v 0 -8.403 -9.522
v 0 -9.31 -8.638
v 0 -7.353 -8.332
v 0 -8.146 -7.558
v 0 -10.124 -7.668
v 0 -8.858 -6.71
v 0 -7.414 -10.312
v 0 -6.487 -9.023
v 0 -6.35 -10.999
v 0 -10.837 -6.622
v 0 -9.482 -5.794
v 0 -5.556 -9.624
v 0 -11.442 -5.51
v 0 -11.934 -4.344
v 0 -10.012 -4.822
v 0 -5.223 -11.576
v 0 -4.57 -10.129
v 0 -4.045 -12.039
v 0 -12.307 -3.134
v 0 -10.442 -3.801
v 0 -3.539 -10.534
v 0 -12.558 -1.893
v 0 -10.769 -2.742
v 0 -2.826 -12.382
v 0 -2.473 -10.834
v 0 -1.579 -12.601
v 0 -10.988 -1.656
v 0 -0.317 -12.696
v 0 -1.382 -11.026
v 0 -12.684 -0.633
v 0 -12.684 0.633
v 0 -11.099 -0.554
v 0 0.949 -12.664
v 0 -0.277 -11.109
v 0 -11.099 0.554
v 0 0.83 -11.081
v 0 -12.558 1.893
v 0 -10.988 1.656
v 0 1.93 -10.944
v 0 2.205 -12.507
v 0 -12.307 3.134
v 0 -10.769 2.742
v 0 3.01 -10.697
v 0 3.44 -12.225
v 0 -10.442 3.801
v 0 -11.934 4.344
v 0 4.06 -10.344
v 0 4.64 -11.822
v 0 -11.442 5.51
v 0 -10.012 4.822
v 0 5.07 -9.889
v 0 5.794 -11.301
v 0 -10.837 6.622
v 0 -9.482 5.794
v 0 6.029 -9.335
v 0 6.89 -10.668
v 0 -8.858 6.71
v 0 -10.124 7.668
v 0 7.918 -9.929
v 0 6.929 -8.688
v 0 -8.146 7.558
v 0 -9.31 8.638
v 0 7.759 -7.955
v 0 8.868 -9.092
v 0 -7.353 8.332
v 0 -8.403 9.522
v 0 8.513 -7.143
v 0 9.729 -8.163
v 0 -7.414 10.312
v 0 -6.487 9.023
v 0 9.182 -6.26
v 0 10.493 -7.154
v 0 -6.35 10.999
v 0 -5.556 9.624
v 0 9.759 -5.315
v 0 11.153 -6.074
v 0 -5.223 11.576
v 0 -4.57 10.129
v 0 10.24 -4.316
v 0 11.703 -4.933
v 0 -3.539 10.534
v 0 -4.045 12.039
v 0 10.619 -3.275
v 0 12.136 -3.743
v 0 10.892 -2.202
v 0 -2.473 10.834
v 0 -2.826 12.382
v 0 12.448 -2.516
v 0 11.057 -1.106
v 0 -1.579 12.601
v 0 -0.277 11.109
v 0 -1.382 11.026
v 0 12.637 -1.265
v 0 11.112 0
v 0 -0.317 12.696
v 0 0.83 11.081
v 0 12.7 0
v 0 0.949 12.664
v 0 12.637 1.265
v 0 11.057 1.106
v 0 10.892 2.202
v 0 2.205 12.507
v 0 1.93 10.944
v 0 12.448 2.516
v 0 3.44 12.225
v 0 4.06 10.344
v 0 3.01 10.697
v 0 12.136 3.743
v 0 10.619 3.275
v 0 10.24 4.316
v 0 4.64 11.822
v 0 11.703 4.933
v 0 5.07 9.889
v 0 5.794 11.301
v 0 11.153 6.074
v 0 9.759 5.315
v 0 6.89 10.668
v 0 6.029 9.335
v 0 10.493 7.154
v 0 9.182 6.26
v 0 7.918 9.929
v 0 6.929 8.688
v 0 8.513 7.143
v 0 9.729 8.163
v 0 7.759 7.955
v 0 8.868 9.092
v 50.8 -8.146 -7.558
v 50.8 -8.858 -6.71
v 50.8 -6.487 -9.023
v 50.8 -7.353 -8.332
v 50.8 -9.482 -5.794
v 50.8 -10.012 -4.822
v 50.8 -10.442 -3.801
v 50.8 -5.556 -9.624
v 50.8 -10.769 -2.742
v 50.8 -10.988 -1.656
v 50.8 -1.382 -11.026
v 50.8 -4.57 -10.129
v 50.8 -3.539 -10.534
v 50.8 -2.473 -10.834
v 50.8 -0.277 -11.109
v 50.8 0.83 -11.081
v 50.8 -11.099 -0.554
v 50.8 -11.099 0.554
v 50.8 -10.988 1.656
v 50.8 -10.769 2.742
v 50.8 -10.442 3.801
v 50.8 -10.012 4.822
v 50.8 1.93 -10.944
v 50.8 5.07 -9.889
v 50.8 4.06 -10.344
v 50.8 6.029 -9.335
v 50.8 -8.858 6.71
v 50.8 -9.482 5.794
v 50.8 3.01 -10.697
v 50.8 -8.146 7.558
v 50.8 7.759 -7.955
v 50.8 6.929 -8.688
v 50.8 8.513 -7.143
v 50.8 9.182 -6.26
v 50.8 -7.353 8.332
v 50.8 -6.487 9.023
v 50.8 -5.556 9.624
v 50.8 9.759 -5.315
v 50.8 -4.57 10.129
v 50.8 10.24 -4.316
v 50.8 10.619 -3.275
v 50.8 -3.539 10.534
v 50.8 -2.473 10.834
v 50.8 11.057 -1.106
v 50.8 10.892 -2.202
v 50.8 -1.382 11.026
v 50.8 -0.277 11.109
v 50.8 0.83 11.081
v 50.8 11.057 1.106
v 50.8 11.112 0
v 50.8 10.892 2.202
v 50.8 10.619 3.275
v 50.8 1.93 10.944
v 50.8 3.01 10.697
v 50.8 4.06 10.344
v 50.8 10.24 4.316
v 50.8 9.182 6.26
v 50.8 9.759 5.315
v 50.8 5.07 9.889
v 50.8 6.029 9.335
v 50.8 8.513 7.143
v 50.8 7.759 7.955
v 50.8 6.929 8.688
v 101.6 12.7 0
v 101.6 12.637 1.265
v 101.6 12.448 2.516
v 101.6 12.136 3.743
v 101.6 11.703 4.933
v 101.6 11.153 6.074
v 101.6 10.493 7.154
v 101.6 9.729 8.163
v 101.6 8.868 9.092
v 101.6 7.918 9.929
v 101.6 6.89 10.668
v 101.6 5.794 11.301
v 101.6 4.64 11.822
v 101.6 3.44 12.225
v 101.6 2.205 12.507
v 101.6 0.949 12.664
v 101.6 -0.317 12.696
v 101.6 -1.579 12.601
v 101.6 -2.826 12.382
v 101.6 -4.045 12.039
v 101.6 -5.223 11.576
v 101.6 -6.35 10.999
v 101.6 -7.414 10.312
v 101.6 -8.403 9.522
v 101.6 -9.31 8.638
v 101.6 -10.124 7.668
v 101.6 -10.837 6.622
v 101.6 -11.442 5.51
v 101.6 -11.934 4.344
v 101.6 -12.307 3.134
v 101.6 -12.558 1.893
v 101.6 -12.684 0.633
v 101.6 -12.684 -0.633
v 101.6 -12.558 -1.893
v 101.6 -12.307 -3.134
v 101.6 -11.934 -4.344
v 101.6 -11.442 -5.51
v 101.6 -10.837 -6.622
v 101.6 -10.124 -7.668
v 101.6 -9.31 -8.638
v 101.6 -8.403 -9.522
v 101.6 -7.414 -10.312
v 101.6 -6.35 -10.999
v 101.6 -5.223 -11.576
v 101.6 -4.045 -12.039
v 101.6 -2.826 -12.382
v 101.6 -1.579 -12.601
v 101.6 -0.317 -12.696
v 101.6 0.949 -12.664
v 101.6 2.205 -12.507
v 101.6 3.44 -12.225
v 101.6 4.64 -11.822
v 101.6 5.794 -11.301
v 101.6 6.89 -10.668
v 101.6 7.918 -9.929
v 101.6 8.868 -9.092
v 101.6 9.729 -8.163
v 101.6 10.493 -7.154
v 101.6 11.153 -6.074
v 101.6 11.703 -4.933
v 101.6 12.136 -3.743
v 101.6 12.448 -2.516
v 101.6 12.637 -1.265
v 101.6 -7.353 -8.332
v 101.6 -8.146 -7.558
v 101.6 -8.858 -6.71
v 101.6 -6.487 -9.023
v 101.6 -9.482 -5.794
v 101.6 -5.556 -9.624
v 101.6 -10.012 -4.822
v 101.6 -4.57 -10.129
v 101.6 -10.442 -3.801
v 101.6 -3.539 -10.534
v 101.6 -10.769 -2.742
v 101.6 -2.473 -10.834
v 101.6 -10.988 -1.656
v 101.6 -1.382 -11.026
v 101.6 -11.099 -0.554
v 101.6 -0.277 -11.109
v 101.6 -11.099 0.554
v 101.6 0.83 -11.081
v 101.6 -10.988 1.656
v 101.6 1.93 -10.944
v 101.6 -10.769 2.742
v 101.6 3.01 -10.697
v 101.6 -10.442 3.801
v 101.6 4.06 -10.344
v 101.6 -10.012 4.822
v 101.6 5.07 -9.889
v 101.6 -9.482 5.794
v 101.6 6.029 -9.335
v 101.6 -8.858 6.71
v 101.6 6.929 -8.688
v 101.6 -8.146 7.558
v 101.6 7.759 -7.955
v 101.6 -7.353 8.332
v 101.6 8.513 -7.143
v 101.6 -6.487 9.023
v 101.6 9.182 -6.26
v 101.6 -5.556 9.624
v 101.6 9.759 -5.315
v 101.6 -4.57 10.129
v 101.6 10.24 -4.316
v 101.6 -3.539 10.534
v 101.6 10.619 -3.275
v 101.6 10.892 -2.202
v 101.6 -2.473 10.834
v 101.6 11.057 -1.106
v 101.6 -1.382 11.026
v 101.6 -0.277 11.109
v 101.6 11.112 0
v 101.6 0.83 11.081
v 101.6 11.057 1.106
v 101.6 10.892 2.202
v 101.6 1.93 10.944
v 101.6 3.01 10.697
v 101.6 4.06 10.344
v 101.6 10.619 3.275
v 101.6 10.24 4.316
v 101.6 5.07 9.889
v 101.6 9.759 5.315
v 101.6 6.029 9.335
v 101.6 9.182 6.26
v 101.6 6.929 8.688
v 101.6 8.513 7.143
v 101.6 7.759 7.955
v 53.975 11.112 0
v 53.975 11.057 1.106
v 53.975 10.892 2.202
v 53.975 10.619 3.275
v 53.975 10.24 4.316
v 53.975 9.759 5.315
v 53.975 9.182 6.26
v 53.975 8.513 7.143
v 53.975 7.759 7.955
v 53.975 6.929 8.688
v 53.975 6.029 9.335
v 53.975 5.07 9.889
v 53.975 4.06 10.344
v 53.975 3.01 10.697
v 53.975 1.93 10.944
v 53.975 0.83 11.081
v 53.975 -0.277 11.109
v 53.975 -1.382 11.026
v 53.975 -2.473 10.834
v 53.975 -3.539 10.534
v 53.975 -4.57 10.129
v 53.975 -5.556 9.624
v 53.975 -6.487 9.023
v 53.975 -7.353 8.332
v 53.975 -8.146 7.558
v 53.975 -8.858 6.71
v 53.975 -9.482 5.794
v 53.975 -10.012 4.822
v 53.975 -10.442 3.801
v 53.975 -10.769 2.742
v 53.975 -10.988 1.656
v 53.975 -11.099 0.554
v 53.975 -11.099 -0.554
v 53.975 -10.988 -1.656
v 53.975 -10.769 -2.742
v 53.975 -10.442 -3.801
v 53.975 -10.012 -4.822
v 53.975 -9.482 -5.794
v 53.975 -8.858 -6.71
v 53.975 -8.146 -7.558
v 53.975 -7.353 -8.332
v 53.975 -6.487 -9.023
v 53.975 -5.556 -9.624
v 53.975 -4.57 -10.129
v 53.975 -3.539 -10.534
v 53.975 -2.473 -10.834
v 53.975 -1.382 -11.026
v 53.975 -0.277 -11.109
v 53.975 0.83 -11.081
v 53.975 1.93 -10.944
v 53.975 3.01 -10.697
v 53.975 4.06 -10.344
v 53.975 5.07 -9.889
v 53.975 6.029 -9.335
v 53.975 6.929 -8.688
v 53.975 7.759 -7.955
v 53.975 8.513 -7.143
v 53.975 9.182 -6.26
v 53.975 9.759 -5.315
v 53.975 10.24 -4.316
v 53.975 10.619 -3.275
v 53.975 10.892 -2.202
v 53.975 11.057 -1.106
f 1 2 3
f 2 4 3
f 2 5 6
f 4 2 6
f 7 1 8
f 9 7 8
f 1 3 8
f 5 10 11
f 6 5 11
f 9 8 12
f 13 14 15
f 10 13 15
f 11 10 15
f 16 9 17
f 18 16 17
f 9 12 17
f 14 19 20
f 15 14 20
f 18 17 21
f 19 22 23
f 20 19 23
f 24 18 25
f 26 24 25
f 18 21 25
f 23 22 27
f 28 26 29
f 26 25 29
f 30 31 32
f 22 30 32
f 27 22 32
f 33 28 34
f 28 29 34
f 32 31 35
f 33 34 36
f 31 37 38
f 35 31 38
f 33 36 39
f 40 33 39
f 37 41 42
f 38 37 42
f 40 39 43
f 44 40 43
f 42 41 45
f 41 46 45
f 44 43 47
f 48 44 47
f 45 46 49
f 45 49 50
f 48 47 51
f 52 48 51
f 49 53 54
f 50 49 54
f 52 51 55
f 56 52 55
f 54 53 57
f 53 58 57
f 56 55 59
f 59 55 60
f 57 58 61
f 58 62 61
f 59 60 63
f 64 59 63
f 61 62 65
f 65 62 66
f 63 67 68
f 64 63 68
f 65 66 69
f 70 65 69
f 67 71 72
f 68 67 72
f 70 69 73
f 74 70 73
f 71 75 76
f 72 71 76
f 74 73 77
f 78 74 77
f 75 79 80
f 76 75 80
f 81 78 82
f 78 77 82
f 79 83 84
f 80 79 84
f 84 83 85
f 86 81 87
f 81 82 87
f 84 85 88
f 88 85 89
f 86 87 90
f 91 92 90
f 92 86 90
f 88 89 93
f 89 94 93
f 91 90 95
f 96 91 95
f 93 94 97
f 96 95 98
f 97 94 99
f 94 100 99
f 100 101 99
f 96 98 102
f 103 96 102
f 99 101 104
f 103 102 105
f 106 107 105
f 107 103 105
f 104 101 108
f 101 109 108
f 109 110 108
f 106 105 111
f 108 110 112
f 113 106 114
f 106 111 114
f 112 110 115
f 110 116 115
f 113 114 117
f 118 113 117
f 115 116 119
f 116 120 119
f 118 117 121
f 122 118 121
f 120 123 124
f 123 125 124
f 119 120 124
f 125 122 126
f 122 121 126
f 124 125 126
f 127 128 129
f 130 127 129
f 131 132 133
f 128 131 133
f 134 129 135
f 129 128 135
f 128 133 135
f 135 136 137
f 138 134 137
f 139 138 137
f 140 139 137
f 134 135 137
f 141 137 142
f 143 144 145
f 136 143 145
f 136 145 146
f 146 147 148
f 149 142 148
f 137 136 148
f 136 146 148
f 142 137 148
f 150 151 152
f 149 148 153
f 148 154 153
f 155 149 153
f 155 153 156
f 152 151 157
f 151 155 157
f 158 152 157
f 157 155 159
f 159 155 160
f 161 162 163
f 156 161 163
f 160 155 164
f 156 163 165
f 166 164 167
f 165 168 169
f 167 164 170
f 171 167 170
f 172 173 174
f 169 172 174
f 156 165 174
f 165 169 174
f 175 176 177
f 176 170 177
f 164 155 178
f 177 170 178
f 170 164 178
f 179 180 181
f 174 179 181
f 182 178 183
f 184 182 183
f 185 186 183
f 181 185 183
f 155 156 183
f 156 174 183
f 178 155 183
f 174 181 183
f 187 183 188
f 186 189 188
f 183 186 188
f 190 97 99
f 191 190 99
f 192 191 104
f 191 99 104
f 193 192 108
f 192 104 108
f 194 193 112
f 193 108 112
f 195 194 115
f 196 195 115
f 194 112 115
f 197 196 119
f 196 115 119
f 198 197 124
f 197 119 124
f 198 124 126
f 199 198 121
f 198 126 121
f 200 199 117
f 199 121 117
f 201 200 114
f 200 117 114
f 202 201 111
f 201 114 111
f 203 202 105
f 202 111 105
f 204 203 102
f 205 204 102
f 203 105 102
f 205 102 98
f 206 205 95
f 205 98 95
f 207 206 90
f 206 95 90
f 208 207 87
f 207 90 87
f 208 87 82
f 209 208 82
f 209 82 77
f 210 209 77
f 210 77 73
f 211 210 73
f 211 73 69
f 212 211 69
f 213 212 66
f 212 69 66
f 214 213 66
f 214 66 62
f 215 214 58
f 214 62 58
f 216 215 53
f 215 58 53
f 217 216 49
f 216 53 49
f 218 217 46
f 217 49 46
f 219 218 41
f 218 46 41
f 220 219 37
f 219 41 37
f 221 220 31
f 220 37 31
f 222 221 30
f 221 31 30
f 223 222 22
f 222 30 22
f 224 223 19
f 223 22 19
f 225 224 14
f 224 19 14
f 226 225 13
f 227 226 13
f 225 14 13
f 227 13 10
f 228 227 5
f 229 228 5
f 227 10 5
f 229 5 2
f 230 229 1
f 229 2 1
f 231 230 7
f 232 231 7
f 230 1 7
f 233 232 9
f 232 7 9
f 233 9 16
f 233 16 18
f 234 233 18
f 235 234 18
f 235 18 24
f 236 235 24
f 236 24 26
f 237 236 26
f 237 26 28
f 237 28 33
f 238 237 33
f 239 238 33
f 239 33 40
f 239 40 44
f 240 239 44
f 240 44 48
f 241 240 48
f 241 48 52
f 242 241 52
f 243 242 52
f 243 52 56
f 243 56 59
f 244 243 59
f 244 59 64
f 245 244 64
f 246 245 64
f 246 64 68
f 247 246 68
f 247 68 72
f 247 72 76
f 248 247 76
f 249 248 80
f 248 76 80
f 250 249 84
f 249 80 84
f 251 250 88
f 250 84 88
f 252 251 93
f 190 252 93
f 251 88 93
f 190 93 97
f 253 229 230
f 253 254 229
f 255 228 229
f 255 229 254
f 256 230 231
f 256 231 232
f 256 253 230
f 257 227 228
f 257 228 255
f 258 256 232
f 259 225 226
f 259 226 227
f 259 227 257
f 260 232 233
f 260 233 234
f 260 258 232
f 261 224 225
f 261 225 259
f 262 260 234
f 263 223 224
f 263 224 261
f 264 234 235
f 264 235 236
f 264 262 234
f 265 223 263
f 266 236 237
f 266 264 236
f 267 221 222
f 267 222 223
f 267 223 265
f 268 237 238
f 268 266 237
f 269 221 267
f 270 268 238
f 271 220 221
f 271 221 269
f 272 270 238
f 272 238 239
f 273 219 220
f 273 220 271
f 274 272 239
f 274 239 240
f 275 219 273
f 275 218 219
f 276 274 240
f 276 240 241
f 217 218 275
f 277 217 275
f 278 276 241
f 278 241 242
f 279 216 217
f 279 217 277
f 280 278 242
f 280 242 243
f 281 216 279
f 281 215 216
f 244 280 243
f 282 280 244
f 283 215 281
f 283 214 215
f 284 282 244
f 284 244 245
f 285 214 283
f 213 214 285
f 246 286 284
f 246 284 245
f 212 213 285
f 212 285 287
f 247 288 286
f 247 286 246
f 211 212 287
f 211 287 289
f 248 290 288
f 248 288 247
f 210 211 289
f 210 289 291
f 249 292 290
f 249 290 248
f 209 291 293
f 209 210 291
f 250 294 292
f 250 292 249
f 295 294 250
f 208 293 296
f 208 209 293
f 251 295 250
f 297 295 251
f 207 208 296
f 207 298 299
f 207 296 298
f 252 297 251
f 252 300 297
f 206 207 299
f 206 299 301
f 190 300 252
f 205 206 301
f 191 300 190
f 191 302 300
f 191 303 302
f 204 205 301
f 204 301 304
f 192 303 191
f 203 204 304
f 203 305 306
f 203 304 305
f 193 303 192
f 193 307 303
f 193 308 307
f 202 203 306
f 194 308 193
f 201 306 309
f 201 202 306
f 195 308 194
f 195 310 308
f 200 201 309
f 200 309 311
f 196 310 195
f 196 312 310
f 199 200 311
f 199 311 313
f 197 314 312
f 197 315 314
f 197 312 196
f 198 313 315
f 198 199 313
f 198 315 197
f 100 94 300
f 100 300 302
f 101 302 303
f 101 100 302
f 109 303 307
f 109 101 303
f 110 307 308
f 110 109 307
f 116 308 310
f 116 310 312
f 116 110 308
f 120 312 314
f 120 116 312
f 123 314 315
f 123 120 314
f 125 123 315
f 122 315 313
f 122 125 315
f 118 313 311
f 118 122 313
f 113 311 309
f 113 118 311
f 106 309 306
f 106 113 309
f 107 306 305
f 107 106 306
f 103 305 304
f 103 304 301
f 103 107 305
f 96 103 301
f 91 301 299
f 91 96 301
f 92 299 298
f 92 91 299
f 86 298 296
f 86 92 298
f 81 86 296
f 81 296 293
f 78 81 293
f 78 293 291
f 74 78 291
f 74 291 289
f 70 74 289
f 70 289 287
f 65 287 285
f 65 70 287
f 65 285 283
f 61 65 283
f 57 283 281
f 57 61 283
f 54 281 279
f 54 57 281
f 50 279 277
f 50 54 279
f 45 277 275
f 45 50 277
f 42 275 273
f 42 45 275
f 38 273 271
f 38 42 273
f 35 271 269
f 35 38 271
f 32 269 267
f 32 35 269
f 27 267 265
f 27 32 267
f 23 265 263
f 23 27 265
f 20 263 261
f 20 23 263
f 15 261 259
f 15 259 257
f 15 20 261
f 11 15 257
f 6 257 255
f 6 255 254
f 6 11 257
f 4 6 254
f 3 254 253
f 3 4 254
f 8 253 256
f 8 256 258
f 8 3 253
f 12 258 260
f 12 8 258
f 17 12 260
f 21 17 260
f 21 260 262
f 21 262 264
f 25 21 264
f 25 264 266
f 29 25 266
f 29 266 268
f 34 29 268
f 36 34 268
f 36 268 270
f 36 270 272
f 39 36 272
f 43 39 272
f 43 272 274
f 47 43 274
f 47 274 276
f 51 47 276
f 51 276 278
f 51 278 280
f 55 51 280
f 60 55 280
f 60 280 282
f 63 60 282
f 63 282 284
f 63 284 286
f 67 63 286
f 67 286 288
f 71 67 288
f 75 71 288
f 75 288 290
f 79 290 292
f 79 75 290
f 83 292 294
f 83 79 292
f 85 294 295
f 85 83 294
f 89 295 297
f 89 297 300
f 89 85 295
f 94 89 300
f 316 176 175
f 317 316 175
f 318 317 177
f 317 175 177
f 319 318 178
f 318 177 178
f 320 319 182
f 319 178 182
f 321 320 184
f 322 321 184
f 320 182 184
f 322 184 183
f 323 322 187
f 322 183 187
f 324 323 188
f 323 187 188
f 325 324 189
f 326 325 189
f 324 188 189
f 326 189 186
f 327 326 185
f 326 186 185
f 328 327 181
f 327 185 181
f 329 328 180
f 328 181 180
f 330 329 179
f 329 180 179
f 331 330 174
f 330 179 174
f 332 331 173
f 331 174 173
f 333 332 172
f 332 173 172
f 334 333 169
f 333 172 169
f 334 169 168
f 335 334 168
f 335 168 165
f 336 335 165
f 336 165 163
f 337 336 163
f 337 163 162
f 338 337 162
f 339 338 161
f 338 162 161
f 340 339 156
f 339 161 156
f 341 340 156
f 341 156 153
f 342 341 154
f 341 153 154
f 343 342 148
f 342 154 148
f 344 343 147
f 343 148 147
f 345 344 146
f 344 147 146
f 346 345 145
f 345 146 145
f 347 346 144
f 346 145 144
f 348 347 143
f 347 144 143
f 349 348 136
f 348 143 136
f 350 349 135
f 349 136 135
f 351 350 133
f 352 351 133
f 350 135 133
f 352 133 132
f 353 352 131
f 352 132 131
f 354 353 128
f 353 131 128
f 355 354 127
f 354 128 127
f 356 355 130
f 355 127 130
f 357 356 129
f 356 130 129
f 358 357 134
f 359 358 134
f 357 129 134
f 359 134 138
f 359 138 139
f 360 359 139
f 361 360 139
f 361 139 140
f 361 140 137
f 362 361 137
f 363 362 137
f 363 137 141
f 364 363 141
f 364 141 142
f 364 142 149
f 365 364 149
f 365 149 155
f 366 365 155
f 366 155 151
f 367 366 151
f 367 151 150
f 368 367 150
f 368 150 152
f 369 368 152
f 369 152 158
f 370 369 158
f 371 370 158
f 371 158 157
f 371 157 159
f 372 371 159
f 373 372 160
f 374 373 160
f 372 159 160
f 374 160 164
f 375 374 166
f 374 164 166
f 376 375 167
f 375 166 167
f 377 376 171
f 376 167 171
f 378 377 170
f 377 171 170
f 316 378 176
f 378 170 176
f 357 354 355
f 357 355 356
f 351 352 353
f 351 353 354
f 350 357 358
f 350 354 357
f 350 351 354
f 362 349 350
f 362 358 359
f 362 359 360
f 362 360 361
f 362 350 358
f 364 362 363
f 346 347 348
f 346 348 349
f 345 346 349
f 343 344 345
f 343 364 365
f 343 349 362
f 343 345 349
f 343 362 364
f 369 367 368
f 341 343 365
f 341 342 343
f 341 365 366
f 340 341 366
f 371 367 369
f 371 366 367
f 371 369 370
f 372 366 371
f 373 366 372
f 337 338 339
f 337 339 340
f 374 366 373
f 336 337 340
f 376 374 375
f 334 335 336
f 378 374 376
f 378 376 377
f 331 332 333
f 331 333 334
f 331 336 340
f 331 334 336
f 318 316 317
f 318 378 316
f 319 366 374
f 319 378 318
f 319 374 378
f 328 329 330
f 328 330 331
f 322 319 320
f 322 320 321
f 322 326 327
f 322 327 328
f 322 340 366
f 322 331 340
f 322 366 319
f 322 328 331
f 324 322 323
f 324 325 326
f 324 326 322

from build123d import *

# Parameters (mm, degrees)
F0_R     = 12.7
F0_R_2   = 11.1125
F1_DEPTH = 101.6
F3_R     = 11.1125
F4_DEPTH = 3.175


with BuildPart() as f1:
    # F0 (on Right) → F1 (new body)
    with BuildSketch(Plane.YZ):
        Circle(F0_R)
        Circle(F0_R_2, mode=Mode.SUBTRACT)
    extrude(amount=F1_DEPTH)


with BuildPart() as f4:
    # F3 (on offset) → F4 (new body)
    with BuildSketch(Plane.YZ.offset(50.8)):
        Circle(F3_R)
    extrude(amount=F4_DEPTH)


solid = Compound([f1.part, f4.part])
